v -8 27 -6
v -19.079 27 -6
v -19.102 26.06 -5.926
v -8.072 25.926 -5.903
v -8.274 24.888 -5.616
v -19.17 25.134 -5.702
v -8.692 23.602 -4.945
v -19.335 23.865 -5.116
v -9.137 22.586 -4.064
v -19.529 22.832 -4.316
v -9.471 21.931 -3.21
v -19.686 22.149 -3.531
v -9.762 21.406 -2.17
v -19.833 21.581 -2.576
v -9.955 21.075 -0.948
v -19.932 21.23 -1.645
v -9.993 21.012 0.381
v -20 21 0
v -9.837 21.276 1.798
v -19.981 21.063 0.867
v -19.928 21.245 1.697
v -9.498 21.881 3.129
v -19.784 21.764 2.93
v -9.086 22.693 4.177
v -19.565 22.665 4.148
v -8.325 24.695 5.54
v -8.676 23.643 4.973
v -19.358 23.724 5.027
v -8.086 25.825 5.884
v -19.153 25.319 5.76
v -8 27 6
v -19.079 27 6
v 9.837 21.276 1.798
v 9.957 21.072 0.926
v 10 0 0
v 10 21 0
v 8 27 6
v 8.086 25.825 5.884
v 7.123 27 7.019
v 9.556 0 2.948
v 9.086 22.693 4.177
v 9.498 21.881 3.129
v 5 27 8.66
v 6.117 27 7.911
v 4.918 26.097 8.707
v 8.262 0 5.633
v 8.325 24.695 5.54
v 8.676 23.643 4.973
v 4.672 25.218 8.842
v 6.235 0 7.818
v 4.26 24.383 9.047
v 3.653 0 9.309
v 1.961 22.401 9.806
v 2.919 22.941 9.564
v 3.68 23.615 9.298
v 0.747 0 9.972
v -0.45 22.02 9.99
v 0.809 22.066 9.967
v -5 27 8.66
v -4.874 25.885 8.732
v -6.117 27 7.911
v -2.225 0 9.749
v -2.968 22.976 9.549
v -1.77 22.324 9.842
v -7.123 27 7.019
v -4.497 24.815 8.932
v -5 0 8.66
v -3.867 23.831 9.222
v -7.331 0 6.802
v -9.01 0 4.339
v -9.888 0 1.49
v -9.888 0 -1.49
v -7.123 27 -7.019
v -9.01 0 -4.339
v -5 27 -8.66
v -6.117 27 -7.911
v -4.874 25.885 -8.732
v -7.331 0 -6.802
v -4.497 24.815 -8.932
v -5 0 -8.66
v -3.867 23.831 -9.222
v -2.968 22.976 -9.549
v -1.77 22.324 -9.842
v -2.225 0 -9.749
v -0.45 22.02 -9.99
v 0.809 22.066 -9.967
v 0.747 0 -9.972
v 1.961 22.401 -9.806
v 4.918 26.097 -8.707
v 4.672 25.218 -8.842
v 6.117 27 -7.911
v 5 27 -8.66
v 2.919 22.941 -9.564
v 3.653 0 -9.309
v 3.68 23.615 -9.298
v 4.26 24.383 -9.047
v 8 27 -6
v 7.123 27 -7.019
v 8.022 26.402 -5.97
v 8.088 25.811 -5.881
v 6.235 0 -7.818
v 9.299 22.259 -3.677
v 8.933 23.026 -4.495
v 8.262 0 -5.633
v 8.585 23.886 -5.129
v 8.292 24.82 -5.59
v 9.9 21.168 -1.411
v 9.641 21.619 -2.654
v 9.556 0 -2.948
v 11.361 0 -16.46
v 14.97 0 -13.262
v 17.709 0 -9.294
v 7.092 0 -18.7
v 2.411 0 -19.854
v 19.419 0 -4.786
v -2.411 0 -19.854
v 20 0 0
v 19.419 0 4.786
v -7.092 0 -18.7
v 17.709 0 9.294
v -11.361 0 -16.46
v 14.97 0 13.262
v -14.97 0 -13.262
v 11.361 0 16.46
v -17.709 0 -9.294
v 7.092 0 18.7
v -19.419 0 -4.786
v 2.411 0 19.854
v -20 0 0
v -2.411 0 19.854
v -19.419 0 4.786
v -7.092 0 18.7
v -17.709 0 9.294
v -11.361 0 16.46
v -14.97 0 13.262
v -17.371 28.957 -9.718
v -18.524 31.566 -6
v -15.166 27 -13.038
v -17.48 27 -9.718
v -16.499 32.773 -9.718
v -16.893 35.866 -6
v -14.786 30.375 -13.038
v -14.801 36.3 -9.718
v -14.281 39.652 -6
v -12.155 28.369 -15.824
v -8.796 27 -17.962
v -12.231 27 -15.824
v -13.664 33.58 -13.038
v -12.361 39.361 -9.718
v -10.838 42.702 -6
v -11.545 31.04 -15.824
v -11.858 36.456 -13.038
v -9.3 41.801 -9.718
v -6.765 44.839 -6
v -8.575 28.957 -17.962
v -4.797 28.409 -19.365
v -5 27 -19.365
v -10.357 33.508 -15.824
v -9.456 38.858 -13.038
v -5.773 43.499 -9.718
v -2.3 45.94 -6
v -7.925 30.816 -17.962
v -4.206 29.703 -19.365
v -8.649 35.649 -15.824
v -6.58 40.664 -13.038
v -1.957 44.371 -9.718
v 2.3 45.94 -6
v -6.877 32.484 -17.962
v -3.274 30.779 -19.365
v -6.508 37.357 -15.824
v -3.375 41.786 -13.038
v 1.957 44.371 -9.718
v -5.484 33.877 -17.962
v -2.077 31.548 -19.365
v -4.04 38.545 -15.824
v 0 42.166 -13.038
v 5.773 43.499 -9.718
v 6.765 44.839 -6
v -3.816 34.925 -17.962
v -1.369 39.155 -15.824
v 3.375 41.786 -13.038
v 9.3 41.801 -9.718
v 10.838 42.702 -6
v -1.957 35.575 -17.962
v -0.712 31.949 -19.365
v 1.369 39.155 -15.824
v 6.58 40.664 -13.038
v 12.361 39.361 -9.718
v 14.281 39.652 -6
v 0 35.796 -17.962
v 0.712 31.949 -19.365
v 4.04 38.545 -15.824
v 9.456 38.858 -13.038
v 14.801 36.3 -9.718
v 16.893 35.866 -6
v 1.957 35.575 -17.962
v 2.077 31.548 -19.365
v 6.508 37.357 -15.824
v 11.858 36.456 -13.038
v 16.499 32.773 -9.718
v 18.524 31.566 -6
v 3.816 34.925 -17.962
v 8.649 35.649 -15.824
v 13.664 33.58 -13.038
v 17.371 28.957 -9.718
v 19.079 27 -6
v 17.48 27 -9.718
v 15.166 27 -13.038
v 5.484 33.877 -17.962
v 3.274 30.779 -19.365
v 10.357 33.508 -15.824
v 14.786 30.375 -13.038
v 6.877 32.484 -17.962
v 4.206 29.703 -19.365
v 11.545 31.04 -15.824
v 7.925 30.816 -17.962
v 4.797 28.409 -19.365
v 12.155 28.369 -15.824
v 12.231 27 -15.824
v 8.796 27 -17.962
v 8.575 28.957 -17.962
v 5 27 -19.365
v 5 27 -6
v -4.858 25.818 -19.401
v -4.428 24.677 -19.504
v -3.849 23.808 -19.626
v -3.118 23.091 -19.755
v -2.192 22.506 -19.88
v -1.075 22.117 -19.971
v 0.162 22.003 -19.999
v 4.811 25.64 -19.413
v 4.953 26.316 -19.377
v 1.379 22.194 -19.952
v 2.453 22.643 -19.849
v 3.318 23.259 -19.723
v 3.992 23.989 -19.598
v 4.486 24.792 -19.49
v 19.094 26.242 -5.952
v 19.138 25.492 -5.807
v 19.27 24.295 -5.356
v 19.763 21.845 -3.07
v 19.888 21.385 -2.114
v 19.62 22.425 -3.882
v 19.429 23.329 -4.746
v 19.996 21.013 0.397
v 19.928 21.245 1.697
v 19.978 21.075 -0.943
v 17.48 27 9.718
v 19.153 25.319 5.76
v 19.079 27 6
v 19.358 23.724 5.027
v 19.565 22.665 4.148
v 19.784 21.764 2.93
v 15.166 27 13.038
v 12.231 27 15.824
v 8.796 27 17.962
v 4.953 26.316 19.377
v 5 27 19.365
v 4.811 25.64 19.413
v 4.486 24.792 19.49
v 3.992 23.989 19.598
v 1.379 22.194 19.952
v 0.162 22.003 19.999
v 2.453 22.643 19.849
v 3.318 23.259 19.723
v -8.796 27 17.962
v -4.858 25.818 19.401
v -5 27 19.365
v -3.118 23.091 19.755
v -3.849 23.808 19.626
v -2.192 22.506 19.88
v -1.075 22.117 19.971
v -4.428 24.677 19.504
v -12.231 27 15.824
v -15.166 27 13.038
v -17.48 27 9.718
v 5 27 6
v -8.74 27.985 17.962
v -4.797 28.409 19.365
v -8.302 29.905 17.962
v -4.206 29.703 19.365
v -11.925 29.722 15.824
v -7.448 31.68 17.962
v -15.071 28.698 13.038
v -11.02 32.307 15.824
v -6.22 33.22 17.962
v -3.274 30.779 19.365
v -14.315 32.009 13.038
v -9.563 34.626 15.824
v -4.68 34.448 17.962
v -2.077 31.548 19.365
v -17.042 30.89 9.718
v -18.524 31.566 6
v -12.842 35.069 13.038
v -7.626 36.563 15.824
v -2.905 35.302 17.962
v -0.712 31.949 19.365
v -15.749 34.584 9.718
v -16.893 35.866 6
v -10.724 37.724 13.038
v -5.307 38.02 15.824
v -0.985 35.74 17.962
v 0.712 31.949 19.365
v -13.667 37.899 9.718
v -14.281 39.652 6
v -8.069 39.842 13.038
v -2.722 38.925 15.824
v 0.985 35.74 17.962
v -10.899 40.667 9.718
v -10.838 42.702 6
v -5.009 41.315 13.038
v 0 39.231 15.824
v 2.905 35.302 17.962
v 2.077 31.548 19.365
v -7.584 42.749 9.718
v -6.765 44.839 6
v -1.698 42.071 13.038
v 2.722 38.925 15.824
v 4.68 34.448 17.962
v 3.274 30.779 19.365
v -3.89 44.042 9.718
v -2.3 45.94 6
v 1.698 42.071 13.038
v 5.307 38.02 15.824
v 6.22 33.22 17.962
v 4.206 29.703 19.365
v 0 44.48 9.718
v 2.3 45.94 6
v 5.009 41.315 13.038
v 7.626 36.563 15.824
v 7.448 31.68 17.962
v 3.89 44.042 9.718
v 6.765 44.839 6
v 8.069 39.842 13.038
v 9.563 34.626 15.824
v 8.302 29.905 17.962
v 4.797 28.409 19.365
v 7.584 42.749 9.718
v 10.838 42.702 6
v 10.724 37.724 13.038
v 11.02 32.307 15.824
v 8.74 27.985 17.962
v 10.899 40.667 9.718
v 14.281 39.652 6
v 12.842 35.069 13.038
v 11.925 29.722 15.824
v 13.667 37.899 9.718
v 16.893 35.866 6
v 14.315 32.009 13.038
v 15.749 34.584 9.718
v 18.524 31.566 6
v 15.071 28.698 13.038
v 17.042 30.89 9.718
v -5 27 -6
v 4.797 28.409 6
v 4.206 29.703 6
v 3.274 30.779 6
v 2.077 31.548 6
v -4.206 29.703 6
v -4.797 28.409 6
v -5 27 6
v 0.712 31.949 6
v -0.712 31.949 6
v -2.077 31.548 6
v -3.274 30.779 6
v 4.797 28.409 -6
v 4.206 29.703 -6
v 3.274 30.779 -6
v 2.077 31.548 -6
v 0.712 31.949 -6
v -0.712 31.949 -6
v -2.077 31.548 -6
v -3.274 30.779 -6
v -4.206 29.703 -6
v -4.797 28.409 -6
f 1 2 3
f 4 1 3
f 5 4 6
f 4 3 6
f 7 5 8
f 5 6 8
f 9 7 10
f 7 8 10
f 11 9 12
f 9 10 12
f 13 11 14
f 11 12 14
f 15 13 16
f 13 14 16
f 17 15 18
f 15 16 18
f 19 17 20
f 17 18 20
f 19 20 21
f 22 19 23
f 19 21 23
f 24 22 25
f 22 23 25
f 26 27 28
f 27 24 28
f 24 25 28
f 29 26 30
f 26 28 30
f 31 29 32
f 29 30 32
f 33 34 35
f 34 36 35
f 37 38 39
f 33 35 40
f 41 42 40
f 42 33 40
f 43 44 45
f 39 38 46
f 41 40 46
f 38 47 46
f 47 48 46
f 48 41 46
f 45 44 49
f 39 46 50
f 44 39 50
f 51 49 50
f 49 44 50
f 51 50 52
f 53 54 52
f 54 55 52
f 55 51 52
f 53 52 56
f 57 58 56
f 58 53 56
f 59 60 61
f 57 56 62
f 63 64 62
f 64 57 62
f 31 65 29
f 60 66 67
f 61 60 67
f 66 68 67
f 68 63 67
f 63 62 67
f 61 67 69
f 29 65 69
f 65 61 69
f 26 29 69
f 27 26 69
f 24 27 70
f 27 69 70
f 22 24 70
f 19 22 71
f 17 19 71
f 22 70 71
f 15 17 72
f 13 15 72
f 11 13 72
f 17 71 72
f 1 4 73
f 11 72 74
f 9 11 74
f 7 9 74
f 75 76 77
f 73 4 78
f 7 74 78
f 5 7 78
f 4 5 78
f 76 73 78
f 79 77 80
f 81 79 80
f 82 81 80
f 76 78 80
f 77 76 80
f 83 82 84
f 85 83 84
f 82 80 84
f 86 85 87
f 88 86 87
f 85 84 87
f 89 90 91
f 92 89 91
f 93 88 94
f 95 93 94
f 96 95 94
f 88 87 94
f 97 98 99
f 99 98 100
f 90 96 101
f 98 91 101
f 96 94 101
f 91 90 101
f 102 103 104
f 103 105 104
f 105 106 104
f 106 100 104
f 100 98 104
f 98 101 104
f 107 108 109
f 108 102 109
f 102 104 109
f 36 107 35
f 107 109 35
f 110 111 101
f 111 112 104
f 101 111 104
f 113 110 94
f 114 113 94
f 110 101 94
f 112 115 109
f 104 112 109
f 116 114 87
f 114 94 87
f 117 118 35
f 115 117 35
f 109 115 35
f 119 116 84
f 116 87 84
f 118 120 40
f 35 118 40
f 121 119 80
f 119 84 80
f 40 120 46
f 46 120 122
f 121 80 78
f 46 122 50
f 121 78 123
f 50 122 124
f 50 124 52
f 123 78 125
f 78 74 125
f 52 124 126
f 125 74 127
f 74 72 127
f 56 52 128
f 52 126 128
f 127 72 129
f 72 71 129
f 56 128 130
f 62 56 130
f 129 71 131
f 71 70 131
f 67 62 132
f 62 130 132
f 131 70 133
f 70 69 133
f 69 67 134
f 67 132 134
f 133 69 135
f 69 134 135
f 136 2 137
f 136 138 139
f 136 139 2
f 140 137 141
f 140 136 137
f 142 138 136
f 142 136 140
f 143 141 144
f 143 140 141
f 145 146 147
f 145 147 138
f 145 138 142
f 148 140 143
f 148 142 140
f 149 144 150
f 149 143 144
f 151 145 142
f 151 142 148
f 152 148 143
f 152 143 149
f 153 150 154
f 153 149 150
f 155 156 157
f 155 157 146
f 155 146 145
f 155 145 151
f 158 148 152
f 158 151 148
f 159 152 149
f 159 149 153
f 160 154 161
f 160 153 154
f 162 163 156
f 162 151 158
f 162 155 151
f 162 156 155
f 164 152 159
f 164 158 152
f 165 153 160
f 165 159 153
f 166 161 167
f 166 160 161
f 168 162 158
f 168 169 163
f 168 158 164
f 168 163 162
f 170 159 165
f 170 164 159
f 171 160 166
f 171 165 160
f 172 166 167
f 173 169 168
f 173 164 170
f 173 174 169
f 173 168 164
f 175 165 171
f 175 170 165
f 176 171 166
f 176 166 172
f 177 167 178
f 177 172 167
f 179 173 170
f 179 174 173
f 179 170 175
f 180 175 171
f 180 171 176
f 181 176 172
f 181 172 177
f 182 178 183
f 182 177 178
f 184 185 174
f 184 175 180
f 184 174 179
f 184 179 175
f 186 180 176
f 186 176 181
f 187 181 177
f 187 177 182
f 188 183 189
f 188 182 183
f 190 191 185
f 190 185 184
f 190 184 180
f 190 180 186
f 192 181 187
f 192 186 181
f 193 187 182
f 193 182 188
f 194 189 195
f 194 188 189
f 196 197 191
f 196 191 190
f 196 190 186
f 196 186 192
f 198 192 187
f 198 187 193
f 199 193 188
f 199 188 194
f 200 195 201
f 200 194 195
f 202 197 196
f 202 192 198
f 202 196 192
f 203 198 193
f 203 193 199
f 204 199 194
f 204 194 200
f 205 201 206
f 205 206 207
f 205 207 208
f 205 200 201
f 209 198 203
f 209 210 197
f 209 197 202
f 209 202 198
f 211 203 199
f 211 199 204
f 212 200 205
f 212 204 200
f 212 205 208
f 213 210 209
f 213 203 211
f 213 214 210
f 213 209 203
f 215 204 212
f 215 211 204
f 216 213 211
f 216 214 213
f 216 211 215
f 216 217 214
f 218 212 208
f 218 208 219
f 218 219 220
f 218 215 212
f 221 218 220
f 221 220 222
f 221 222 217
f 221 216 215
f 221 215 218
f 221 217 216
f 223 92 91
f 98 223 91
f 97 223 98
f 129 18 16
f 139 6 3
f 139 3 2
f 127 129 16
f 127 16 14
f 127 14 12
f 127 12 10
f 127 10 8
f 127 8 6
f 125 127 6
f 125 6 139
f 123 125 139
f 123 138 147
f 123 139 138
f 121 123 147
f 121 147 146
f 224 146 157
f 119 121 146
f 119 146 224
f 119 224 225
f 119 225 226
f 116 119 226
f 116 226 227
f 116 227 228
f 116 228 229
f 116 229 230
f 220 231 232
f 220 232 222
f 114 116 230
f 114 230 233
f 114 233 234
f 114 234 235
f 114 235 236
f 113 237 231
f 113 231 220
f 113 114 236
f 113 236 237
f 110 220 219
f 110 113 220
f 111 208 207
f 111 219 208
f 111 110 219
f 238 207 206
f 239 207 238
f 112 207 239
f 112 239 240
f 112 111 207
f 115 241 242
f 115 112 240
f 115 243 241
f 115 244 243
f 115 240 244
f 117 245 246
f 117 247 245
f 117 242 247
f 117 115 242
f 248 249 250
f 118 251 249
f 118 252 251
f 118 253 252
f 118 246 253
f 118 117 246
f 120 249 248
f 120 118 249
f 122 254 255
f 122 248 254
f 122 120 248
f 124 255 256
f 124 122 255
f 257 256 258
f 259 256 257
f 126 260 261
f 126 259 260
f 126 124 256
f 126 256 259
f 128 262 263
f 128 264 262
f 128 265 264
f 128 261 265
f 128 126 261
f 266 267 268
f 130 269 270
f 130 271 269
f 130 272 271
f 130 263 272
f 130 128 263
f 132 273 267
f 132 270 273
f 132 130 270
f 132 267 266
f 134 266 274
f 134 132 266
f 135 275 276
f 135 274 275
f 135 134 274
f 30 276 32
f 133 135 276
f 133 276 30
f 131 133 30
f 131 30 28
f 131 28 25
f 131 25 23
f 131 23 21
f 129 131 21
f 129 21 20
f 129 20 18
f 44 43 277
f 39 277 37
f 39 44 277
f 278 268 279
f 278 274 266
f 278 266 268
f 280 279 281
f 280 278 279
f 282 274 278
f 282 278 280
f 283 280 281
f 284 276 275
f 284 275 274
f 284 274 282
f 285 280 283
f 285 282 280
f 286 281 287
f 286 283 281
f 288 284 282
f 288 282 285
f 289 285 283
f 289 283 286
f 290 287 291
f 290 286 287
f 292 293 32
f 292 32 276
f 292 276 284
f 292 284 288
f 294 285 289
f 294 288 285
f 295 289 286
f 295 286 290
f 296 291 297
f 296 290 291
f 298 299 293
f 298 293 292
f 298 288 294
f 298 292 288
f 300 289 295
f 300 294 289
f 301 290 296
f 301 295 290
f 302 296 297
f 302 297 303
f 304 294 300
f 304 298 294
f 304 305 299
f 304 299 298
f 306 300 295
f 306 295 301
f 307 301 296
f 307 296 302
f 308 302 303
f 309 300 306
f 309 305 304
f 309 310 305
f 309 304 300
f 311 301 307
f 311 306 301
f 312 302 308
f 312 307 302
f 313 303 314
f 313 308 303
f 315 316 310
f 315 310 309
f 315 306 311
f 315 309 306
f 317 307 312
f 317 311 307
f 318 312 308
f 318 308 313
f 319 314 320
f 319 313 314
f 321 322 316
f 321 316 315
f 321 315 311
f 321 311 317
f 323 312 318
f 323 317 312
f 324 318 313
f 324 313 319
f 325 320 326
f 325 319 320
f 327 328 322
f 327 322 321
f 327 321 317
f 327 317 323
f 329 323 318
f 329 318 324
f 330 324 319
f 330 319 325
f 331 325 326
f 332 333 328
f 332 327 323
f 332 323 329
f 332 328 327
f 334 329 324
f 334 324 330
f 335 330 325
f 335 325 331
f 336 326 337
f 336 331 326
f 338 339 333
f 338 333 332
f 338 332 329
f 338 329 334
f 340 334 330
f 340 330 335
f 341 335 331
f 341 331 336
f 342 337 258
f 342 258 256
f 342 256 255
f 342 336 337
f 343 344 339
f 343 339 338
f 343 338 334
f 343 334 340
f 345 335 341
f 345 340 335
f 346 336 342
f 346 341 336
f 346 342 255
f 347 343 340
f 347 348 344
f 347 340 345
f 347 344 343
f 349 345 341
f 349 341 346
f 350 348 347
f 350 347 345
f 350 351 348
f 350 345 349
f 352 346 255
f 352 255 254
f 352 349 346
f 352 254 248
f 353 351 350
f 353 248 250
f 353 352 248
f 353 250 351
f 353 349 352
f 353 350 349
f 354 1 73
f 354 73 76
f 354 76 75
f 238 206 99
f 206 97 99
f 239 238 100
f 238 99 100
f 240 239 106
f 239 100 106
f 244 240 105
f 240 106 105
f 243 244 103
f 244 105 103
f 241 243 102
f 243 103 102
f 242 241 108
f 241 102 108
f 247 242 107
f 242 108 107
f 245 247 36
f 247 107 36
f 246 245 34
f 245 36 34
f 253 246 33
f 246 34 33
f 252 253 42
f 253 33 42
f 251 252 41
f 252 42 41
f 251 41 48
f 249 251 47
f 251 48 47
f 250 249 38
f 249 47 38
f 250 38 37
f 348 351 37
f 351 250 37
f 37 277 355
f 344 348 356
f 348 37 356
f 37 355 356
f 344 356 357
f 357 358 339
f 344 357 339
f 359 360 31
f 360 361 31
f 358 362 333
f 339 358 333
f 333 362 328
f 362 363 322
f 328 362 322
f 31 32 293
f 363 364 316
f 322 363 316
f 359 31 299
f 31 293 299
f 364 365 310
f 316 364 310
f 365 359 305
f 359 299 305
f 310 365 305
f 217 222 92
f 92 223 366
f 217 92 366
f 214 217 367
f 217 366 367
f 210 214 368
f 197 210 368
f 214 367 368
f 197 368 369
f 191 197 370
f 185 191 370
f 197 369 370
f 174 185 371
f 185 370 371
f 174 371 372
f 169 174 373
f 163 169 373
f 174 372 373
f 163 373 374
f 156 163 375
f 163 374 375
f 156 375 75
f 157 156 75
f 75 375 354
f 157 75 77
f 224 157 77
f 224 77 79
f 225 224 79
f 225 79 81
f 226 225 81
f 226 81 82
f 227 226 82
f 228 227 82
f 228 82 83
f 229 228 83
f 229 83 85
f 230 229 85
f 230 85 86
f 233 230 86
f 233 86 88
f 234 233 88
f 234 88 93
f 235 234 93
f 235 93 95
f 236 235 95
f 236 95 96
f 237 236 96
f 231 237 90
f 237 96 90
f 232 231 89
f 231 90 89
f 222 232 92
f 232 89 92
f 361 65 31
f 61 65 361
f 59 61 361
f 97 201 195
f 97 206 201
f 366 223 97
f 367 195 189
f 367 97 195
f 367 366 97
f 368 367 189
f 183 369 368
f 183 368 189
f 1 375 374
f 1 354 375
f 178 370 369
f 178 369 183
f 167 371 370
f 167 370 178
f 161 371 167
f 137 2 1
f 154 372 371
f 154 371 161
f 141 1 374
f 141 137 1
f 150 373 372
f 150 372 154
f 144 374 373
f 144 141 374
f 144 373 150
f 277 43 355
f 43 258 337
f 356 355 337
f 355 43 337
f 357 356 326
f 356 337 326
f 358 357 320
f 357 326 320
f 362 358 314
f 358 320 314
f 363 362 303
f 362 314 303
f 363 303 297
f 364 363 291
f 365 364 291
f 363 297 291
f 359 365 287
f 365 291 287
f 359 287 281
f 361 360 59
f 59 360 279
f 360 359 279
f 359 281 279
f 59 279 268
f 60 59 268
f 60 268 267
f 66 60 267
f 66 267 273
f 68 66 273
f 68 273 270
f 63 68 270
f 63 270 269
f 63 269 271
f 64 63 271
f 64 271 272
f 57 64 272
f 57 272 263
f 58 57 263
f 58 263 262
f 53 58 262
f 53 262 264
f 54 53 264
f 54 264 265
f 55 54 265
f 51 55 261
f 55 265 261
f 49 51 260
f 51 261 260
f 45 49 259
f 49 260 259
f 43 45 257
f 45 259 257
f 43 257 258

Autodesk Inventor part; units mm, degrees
ref_plane "YZ Plane" through (0, 0, 0) normal (1, 0, 0) x (0, 1, 0)
ref_plane "XZ Plane" through (0, 0, 0) normal (0, 1, 0) x (-1, 0, 0)
ref_plane "XY Plane" through (0, 0, 0) normal (0, 0, 1) x (1, 0, 0)
sketch "Sketch1" plane through (0, 0, 0) normal (0, 1, 0) x (-1, 0, 0)
  circle A0 centre (0, 0) radius 20
  dimension "d0" = 40
extrude "Extrusion1" add sketch "Sketch1" along normal blind 27
sketch "Sketch2" plane through (0, 27, 0) normal (0, 1, 0) x (1, 0, 0)
  circle A0 centre (0, 0) radius 20 construction
  circle A1 centre (0, 0) radius 20 construction
  line L0 (0, -20) -> (0, 20) construction
  arc A2 (0, -20) -> (0, 20) centre (0, 0) ccw
  line L1 (0, -20) -> (0, 20)
  dimension "d3" = 40
revolve "Revolution1" add sketch "Sketch2" angle 180 about axis through (0, 27, 20) along (0, 0, 1)
sketch "Sketch3" plane through (0, 0, 0) normal (0, 0, 1) x (1, 0, 0)
  line L0 (20, 27) -> (-20, 27) construction
  line L1 (20, 27) -> (-20, 27) construction
  line L2 (20, 0) -> (-20, 0) construction
  circle A0 centre (0, 27) radius 5
  arc A1 (20, 27) -> (-20, 27) centre (0, 27) ccw construction
  point P0 (0, 0)
  point P1 (0, 0)
  dimension "d5" = 10
extrude "Extrusion2" cut sketch "Sketch3" along normal through all both and the other way through all
sketch "Sketch4" plane through (0, 0, 0) normal (1, 0, 0) x (0, 1, 0)
  line L0 (27, 19.3649) -> (27, 19.3649) construction
  line L1 (27, 19.3649) -> (27, -19.3649) construction
  line L2 (27, -19.3649) -> (27, -19.3649) construction
  line L3 (27, -19.3649) -> (27, 19.3649) construction
  line L4 (27, 19.3649) -> (27, 19.3649) construction
  line L5 (27, -19.3649) -> (27, -19.3649) construction
  line L6 (0, -20) -> (0, 20) construction
  line L7 (27, -19.3649) -> (27, 19.3649) construction
  line L8 (27, 19.3649) -> (27, -19.3649) construction
  line L9 (27, -19.3649) -> (27, 19.3649) construction
  arc A0 (27, 6) -> (27, -6) centre (27, 0) ccw
  line L10 (27, -6) -> (47.2684, -6)
  line L11 (27, 6) -> (47.2684, 6)
  line L12 (47.2684, -6) -> (47.2684, 6)
  point P0 (0, 0)
  dimension "d8" = 12
  dimension "d9" = 20.2684
extrude "Extrusion3" cut sketch "Sketch4" along normal through all both and the other way through all
sketch "Sketch5" plane through (0, 0, 0) normal (0, -1, 0) x (1, 0, 0)
  circle A0 centre (0, 0) radius 10
  dimension "d12" = 20
extrude "Extrusion4" cut sketch "Sketch5" against normal up to surface (27 mm away)
properties part number "cupula_obj5"
